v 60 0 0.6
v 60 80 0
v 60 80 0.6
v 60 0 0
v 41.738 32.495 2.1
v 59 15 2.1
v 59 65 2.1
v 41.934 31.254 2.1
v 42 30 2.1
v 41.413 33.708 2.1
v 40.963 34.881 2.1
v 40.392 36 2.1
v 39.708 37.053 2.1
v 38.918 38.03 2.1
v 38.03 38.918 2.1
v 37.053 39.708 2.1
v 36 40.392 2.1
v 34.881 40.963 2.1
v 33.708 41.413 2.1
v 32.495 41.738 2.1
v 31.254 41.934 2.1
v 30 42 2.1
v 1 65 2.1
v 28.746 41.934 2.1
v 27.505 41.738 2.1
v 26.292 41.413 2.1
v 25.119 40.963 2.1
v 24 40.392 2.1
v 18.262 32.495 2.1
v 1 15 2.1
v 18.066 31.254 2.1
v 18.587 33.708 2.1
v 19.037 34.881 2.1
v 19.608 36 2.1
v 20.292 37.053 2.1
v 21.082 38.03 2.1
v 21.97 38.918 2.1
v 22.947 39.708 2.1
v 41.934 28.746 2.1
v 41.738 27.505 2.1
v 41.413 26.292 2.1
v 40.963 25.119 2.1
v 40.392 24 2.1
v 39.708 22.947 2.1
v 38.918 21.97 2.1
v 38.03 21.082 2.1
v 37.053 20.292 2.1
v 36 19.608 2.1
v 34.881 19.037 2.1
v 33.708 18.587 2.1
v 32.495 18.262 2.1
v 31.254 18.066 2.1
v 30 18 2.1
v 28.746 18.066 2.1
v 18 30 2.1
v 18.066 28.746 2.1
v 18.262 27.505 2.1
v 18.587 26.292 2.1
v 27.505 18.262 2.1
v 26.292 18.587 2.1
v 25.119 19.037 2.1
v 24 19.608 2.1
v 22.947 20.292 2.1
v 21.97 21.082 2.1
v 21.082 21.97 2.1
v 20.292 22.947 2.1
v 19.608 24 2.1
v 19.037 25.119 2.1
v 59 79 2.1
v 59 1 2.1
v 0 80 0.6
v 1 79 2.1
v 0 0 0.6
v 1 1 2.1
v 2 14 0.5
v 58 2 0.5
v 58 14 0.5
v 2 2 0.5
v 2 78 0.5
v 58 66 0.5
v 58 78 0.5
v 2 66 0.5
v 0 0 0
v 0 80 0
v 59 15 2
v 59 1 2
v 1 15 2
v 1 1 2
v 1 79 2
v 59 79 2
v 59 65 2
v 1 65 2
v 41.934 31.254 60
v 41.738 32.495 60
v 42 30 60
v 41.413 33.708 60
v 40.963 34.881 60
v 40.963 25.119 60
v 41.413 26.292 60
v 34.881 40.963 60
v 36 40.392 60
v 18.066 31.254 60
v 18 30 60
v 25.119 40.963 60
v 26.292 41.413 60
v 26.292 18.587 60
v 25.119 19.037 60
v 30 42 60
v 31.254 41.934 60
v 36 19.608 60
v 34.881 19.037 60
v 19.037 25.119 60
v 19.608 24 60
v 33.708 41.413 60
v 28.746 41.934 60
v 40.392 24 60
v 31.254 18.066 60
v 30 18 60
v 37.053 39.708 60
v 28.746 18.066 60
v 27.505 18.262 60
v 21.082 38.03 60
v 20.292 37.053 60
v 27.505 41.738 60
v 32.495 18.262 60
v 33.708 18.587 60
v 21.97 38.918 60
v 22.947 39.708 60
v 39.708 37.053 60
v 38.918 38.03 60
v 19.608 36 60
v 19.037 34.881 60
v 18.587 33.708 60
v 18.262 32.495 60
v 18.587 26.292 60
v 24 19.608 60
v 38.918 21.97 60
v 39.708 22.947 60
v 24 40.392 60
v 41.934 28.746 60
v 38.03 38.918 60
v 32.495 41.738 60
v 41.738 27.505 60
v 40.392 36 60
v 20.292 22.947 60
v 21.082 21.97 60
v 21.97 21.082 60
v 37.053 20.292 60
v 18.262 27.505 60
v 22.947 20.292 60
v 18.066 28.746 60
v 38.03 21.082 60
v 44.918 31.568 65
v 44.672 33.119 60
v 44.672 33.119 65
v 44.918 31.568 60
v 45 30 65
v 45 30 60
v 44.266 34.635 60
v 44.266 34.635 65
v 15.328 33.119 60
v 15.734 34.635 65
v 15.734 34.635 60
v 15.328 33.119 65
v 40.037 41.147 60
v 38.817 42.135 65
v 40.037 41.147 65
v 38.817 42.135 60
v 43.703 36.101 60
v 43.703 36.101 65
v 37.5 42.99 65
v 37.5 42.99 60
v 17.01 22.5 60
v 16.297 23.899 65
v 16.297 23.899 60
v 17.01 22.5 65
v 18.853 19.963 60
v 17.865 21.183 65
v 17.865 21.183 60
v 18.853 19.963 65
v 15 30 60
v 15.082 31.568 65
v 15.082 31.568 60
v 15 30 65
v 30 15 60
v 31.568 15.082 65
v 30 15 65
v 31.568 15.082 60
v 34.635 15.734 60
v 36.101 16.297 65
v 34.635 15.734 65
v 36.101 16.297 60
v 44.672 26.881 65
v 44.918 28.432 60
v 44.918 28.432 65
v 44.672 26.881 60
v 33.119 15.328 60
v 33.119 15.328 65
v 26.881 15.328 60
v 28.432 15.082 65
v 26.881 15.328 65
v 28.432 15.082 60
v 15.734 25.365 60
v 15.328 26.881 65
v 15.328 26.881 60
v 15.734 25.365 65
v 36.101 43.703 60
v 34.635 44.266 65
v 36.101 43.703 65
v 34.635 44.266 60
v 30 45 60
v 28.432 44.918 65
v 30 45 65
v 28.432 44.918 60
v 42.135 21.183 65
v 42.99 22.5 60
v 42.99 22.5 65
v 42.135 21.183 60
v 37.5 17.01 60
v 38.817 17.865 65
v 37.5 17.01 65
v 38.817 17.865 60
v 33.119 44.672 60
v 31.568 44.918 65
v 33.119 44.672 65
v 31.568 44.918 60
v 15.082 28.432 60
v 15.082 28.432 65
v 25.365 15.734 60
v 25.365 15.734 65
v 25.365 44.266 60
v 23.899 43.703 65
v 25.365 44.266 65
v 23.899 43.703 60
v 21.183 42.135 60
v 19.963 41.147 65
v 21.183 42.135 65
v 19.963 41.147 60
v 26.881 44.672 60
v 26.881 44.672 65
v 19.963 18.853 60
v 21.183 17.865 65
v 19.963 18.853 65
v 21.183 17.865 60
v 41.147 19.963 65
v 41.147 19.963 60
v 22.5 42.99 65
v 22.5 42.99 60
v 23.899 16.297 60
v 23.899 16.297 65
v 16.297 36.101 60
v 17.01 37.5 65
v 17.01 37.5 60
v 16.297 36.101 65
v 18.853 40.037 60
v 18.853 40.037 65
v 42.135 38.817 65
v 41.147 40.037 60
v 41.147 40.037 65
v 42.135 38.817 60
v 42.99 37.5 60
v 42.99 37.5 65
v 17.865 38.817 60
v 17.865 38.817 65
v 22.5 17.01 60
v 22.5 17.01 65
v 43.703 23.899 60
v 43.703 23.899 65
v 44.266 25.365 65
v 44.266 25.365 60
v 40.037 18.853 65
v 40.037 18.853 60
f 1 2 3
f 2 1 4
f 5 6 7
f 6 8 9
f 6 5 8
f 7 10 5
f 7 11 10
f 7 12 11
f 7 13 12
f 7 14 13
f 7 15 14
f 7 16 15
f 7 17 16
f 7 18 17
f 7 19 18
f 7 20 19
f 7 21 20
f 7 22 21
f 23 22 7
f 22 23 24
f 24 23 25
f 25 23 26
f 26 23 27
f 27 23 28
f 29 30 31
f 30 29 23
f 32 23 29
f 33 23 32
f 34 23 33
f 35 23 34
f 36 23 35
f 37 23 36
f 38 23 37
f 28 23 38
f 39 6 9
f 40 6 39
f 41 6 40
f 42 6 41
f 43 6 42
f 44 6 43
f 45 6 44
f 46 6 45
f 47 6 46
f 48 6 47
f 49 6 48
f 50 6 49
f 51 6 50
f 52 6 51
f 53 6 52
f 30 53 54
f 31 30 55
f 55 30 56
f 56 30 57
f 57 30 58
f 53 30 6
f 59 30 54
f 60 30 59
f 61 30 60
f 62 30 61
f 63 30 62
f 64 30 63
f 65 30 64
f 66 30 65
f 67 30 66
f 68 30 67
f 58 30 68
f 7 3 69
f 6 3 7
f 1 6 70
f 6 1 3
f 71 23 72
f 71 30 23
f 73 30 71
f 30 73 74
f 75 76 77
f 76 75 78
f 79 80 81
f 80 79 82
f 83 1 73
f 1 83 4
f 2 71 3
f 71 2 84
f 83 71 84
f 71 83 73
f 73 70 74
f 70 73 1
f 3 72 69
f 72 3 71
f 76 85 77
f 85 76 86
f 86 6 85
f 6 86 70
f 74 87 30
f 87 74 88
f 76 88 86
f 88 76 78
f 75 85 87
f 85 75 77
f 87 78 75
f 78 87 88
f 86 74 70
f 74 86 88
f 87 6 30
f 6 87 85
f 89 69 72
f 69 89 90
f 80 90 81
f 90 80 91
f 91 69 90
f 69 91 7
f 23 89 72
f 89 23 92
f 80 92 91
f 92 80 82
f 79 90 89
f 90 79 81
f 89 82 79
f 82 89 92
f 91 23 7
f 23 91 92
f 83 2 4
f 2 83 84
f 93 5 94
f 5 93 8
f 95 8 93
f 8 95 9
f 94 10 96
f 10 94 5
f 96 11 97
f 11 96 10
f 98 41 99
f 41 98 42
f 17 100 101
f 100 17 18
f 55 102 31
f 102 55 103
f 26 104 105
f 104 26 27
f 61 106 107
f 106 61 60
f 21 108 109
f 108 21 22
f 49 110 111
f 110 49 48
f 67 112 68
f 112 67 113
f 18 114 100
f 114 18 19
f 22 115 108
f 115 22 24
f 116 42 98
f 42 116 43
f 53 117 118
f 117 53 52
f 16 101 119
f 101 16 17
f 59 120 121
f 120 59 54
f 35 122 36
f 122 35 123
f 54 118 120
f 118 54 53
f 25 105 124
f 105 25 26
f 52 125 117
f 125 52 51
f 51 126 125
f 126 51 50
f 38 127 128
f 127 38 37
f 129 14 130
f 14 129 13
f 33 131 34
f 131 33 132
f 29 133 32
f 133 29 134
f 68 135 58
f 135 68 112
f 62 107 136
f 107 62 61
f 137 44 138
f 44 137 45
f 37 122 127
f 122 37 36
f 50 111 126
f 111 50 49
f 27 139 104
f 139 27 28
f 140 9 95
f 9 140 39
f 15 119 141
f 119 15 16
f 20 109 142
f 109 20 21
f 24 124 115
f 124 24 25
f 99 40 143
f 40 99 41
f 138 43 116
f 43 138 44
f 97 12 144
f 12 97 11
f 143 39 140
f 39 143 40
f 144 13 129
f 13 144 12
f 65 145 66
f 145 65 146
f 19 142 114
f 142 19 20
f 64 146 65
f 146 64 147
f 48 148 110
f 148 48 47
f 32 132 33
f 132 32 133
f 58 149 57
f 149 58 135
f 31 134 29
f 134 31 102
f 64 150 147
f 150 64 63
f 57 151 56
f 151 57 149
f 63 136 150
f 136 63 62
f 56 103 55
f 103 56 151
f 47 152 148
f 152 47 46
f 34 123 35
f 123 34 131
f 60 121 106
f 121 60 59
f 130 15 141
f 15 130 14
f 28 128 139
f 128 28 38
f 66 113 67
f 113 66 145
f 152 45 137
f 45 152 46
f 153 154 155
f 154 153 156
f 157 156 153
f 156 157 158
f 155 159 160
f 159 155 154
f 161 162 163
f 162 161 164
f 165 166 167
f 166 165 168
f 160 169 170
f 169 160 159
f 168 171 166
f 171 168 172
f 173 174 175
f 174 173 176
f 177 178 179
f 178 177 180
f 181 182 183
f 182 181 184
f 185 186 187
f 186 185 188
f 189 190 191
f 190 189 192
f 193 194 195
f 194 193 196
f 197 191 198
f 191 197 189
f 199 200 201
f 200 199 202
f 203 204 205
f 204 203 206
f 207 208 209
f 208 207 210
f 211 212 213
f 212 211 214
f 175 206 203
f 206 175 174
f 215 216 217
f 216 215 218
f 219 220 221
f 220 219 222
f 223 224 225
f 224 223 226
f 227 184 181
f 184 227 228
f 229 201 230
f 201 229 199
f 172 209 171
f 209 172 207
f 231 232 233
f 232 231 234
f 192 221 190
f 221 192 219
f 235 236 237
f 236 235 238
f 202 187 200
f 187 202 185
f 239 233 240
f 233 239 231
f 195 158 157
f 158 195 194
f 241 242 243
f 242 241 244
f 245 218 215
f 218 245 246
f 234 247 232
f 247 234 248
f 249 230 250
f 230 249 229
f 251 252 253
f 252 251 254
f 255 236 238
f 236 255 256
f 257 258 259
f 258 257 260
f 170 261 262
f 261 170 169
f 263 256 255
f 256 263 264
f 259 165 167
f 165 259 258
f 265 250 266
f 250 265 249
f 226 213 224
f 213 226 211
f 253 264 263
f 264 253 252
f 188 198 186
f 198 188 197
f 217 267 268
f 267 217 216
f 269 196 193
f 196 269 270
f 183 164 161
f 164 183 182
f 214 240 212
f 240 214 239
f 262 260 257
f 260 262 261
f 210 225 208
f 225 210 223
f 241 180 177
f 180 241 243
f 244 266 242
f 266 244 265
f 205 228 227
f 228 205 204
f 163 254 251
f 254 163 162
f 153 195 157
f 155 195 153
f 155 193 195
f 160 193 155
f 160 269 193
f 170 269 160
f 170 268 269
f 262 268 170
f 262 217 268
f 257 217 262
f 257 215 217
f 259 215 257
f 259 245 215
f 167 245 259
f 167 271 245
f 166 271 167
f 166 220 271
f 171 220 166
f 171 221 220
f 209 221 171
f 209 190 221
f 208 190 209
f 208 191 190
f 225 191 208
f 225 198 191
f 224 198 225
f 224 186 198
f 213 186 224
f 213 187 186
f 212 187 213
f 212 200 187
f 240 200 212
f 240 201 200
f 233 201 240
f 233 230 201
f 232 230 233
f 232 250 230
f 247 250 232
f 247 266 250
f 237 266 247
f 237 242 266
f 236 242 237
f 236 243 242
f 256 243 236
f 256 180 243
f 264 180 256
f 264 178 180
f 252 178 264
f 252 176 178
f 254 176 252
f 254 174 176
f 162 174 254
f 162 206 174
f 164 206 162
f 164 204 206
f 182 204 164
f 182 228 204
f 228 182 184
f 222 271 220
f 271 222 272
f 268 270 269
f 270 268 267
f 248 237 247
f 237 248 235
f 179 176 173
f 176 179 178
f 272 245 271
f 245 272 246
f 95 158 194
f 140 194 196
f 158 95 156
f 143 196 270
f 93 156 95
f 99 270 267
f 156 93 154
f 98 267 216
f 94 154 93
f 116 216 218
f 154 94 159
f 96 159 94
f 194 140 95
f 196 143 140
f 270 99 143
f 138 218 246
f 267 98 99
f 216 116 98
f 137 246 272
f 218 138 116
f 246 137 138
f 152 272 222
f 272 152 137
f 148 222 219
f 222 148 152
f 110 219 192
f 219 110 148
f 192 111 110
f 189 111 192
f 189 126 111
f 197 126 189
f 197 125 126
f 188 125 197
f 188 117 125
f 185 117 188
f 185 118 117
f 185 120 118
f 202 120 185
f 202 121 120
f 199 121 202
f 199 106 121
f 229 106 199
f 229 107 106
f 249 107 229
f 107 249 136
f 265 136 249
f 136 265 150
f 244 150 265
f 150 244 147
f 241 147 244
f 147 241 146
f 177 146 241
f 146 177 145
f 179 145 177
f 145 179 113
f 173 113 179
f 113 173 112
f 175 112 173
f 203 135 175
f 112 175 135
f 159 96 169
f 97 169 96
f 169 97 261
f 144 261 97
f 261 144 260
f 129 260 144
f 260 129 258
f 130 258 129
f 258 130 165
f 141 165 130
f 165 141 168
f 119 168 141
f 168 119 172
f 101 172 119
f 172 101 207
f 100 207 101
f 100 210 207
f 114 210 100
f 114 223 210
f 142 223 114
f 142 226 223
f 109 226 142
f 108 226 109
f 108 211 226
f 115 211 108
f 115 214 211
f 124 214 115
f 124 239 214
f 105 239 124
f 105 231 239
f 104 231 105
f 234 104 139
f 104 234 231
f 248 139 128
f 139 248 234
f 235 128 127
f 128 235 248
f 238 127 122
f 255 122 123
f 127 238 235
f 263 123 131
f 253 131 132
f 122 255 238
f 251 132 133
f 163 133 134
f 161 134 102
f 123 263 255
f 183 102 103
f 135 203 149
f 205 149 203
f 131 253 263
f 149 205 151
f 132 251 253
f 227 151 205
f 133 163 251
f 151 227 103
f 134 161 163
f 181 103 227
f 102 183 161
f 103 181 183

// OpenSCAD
echo(version=version());
// Base Config
base_W = 60;
base_H = 80;
base_T = 0.5;
default_T = 2.0;
default_S = 12;
$fn = 60;

staple_base(base_T,base_W,base_H,default_S,default_T);

translate([30, 30, 0]) cylinder(h = 63, r = 12);
translate([30, 30, 60]) cylinder(h = 5, r = 15);

module stapler_area(bt,bw,ds,dt) {
    hull() {
        translate([0, 0, dt - bt]) cube([bw - dt, ds + 2, 0.1]);
        translate([1, 1, 0]) cube([bw - dt * 2, ds, 0.1]);
    }
}

module staple_base(bt,bw,bh,ds,dt) {
    union() {
        // Base1(Bottom)
        cube([bw, bh, bt]);
        // Base2(Top)
        translate([0, 0, bt]) {
            difference() {
                // Base2_body
                hull() {
                    translate([1, 1, dt - bt]) cube([bw - 2, bh - 2, 0.1]);
                    translate([0, 0, 0]) cube([bw, bh, 0.1]);
                }
                // Base2_stapler_area1(Top)
                # translate([dt - 1, dt - 1, 0]) stapler_area(bt,bw,ds,dt);
                // Base2_stapler_area2(Bottom)
                # translate([dt - 1, bh - ds - dt - 1, 0]) stapler_area(bt,bw,ds,dt);
            }
        }
    }
}
